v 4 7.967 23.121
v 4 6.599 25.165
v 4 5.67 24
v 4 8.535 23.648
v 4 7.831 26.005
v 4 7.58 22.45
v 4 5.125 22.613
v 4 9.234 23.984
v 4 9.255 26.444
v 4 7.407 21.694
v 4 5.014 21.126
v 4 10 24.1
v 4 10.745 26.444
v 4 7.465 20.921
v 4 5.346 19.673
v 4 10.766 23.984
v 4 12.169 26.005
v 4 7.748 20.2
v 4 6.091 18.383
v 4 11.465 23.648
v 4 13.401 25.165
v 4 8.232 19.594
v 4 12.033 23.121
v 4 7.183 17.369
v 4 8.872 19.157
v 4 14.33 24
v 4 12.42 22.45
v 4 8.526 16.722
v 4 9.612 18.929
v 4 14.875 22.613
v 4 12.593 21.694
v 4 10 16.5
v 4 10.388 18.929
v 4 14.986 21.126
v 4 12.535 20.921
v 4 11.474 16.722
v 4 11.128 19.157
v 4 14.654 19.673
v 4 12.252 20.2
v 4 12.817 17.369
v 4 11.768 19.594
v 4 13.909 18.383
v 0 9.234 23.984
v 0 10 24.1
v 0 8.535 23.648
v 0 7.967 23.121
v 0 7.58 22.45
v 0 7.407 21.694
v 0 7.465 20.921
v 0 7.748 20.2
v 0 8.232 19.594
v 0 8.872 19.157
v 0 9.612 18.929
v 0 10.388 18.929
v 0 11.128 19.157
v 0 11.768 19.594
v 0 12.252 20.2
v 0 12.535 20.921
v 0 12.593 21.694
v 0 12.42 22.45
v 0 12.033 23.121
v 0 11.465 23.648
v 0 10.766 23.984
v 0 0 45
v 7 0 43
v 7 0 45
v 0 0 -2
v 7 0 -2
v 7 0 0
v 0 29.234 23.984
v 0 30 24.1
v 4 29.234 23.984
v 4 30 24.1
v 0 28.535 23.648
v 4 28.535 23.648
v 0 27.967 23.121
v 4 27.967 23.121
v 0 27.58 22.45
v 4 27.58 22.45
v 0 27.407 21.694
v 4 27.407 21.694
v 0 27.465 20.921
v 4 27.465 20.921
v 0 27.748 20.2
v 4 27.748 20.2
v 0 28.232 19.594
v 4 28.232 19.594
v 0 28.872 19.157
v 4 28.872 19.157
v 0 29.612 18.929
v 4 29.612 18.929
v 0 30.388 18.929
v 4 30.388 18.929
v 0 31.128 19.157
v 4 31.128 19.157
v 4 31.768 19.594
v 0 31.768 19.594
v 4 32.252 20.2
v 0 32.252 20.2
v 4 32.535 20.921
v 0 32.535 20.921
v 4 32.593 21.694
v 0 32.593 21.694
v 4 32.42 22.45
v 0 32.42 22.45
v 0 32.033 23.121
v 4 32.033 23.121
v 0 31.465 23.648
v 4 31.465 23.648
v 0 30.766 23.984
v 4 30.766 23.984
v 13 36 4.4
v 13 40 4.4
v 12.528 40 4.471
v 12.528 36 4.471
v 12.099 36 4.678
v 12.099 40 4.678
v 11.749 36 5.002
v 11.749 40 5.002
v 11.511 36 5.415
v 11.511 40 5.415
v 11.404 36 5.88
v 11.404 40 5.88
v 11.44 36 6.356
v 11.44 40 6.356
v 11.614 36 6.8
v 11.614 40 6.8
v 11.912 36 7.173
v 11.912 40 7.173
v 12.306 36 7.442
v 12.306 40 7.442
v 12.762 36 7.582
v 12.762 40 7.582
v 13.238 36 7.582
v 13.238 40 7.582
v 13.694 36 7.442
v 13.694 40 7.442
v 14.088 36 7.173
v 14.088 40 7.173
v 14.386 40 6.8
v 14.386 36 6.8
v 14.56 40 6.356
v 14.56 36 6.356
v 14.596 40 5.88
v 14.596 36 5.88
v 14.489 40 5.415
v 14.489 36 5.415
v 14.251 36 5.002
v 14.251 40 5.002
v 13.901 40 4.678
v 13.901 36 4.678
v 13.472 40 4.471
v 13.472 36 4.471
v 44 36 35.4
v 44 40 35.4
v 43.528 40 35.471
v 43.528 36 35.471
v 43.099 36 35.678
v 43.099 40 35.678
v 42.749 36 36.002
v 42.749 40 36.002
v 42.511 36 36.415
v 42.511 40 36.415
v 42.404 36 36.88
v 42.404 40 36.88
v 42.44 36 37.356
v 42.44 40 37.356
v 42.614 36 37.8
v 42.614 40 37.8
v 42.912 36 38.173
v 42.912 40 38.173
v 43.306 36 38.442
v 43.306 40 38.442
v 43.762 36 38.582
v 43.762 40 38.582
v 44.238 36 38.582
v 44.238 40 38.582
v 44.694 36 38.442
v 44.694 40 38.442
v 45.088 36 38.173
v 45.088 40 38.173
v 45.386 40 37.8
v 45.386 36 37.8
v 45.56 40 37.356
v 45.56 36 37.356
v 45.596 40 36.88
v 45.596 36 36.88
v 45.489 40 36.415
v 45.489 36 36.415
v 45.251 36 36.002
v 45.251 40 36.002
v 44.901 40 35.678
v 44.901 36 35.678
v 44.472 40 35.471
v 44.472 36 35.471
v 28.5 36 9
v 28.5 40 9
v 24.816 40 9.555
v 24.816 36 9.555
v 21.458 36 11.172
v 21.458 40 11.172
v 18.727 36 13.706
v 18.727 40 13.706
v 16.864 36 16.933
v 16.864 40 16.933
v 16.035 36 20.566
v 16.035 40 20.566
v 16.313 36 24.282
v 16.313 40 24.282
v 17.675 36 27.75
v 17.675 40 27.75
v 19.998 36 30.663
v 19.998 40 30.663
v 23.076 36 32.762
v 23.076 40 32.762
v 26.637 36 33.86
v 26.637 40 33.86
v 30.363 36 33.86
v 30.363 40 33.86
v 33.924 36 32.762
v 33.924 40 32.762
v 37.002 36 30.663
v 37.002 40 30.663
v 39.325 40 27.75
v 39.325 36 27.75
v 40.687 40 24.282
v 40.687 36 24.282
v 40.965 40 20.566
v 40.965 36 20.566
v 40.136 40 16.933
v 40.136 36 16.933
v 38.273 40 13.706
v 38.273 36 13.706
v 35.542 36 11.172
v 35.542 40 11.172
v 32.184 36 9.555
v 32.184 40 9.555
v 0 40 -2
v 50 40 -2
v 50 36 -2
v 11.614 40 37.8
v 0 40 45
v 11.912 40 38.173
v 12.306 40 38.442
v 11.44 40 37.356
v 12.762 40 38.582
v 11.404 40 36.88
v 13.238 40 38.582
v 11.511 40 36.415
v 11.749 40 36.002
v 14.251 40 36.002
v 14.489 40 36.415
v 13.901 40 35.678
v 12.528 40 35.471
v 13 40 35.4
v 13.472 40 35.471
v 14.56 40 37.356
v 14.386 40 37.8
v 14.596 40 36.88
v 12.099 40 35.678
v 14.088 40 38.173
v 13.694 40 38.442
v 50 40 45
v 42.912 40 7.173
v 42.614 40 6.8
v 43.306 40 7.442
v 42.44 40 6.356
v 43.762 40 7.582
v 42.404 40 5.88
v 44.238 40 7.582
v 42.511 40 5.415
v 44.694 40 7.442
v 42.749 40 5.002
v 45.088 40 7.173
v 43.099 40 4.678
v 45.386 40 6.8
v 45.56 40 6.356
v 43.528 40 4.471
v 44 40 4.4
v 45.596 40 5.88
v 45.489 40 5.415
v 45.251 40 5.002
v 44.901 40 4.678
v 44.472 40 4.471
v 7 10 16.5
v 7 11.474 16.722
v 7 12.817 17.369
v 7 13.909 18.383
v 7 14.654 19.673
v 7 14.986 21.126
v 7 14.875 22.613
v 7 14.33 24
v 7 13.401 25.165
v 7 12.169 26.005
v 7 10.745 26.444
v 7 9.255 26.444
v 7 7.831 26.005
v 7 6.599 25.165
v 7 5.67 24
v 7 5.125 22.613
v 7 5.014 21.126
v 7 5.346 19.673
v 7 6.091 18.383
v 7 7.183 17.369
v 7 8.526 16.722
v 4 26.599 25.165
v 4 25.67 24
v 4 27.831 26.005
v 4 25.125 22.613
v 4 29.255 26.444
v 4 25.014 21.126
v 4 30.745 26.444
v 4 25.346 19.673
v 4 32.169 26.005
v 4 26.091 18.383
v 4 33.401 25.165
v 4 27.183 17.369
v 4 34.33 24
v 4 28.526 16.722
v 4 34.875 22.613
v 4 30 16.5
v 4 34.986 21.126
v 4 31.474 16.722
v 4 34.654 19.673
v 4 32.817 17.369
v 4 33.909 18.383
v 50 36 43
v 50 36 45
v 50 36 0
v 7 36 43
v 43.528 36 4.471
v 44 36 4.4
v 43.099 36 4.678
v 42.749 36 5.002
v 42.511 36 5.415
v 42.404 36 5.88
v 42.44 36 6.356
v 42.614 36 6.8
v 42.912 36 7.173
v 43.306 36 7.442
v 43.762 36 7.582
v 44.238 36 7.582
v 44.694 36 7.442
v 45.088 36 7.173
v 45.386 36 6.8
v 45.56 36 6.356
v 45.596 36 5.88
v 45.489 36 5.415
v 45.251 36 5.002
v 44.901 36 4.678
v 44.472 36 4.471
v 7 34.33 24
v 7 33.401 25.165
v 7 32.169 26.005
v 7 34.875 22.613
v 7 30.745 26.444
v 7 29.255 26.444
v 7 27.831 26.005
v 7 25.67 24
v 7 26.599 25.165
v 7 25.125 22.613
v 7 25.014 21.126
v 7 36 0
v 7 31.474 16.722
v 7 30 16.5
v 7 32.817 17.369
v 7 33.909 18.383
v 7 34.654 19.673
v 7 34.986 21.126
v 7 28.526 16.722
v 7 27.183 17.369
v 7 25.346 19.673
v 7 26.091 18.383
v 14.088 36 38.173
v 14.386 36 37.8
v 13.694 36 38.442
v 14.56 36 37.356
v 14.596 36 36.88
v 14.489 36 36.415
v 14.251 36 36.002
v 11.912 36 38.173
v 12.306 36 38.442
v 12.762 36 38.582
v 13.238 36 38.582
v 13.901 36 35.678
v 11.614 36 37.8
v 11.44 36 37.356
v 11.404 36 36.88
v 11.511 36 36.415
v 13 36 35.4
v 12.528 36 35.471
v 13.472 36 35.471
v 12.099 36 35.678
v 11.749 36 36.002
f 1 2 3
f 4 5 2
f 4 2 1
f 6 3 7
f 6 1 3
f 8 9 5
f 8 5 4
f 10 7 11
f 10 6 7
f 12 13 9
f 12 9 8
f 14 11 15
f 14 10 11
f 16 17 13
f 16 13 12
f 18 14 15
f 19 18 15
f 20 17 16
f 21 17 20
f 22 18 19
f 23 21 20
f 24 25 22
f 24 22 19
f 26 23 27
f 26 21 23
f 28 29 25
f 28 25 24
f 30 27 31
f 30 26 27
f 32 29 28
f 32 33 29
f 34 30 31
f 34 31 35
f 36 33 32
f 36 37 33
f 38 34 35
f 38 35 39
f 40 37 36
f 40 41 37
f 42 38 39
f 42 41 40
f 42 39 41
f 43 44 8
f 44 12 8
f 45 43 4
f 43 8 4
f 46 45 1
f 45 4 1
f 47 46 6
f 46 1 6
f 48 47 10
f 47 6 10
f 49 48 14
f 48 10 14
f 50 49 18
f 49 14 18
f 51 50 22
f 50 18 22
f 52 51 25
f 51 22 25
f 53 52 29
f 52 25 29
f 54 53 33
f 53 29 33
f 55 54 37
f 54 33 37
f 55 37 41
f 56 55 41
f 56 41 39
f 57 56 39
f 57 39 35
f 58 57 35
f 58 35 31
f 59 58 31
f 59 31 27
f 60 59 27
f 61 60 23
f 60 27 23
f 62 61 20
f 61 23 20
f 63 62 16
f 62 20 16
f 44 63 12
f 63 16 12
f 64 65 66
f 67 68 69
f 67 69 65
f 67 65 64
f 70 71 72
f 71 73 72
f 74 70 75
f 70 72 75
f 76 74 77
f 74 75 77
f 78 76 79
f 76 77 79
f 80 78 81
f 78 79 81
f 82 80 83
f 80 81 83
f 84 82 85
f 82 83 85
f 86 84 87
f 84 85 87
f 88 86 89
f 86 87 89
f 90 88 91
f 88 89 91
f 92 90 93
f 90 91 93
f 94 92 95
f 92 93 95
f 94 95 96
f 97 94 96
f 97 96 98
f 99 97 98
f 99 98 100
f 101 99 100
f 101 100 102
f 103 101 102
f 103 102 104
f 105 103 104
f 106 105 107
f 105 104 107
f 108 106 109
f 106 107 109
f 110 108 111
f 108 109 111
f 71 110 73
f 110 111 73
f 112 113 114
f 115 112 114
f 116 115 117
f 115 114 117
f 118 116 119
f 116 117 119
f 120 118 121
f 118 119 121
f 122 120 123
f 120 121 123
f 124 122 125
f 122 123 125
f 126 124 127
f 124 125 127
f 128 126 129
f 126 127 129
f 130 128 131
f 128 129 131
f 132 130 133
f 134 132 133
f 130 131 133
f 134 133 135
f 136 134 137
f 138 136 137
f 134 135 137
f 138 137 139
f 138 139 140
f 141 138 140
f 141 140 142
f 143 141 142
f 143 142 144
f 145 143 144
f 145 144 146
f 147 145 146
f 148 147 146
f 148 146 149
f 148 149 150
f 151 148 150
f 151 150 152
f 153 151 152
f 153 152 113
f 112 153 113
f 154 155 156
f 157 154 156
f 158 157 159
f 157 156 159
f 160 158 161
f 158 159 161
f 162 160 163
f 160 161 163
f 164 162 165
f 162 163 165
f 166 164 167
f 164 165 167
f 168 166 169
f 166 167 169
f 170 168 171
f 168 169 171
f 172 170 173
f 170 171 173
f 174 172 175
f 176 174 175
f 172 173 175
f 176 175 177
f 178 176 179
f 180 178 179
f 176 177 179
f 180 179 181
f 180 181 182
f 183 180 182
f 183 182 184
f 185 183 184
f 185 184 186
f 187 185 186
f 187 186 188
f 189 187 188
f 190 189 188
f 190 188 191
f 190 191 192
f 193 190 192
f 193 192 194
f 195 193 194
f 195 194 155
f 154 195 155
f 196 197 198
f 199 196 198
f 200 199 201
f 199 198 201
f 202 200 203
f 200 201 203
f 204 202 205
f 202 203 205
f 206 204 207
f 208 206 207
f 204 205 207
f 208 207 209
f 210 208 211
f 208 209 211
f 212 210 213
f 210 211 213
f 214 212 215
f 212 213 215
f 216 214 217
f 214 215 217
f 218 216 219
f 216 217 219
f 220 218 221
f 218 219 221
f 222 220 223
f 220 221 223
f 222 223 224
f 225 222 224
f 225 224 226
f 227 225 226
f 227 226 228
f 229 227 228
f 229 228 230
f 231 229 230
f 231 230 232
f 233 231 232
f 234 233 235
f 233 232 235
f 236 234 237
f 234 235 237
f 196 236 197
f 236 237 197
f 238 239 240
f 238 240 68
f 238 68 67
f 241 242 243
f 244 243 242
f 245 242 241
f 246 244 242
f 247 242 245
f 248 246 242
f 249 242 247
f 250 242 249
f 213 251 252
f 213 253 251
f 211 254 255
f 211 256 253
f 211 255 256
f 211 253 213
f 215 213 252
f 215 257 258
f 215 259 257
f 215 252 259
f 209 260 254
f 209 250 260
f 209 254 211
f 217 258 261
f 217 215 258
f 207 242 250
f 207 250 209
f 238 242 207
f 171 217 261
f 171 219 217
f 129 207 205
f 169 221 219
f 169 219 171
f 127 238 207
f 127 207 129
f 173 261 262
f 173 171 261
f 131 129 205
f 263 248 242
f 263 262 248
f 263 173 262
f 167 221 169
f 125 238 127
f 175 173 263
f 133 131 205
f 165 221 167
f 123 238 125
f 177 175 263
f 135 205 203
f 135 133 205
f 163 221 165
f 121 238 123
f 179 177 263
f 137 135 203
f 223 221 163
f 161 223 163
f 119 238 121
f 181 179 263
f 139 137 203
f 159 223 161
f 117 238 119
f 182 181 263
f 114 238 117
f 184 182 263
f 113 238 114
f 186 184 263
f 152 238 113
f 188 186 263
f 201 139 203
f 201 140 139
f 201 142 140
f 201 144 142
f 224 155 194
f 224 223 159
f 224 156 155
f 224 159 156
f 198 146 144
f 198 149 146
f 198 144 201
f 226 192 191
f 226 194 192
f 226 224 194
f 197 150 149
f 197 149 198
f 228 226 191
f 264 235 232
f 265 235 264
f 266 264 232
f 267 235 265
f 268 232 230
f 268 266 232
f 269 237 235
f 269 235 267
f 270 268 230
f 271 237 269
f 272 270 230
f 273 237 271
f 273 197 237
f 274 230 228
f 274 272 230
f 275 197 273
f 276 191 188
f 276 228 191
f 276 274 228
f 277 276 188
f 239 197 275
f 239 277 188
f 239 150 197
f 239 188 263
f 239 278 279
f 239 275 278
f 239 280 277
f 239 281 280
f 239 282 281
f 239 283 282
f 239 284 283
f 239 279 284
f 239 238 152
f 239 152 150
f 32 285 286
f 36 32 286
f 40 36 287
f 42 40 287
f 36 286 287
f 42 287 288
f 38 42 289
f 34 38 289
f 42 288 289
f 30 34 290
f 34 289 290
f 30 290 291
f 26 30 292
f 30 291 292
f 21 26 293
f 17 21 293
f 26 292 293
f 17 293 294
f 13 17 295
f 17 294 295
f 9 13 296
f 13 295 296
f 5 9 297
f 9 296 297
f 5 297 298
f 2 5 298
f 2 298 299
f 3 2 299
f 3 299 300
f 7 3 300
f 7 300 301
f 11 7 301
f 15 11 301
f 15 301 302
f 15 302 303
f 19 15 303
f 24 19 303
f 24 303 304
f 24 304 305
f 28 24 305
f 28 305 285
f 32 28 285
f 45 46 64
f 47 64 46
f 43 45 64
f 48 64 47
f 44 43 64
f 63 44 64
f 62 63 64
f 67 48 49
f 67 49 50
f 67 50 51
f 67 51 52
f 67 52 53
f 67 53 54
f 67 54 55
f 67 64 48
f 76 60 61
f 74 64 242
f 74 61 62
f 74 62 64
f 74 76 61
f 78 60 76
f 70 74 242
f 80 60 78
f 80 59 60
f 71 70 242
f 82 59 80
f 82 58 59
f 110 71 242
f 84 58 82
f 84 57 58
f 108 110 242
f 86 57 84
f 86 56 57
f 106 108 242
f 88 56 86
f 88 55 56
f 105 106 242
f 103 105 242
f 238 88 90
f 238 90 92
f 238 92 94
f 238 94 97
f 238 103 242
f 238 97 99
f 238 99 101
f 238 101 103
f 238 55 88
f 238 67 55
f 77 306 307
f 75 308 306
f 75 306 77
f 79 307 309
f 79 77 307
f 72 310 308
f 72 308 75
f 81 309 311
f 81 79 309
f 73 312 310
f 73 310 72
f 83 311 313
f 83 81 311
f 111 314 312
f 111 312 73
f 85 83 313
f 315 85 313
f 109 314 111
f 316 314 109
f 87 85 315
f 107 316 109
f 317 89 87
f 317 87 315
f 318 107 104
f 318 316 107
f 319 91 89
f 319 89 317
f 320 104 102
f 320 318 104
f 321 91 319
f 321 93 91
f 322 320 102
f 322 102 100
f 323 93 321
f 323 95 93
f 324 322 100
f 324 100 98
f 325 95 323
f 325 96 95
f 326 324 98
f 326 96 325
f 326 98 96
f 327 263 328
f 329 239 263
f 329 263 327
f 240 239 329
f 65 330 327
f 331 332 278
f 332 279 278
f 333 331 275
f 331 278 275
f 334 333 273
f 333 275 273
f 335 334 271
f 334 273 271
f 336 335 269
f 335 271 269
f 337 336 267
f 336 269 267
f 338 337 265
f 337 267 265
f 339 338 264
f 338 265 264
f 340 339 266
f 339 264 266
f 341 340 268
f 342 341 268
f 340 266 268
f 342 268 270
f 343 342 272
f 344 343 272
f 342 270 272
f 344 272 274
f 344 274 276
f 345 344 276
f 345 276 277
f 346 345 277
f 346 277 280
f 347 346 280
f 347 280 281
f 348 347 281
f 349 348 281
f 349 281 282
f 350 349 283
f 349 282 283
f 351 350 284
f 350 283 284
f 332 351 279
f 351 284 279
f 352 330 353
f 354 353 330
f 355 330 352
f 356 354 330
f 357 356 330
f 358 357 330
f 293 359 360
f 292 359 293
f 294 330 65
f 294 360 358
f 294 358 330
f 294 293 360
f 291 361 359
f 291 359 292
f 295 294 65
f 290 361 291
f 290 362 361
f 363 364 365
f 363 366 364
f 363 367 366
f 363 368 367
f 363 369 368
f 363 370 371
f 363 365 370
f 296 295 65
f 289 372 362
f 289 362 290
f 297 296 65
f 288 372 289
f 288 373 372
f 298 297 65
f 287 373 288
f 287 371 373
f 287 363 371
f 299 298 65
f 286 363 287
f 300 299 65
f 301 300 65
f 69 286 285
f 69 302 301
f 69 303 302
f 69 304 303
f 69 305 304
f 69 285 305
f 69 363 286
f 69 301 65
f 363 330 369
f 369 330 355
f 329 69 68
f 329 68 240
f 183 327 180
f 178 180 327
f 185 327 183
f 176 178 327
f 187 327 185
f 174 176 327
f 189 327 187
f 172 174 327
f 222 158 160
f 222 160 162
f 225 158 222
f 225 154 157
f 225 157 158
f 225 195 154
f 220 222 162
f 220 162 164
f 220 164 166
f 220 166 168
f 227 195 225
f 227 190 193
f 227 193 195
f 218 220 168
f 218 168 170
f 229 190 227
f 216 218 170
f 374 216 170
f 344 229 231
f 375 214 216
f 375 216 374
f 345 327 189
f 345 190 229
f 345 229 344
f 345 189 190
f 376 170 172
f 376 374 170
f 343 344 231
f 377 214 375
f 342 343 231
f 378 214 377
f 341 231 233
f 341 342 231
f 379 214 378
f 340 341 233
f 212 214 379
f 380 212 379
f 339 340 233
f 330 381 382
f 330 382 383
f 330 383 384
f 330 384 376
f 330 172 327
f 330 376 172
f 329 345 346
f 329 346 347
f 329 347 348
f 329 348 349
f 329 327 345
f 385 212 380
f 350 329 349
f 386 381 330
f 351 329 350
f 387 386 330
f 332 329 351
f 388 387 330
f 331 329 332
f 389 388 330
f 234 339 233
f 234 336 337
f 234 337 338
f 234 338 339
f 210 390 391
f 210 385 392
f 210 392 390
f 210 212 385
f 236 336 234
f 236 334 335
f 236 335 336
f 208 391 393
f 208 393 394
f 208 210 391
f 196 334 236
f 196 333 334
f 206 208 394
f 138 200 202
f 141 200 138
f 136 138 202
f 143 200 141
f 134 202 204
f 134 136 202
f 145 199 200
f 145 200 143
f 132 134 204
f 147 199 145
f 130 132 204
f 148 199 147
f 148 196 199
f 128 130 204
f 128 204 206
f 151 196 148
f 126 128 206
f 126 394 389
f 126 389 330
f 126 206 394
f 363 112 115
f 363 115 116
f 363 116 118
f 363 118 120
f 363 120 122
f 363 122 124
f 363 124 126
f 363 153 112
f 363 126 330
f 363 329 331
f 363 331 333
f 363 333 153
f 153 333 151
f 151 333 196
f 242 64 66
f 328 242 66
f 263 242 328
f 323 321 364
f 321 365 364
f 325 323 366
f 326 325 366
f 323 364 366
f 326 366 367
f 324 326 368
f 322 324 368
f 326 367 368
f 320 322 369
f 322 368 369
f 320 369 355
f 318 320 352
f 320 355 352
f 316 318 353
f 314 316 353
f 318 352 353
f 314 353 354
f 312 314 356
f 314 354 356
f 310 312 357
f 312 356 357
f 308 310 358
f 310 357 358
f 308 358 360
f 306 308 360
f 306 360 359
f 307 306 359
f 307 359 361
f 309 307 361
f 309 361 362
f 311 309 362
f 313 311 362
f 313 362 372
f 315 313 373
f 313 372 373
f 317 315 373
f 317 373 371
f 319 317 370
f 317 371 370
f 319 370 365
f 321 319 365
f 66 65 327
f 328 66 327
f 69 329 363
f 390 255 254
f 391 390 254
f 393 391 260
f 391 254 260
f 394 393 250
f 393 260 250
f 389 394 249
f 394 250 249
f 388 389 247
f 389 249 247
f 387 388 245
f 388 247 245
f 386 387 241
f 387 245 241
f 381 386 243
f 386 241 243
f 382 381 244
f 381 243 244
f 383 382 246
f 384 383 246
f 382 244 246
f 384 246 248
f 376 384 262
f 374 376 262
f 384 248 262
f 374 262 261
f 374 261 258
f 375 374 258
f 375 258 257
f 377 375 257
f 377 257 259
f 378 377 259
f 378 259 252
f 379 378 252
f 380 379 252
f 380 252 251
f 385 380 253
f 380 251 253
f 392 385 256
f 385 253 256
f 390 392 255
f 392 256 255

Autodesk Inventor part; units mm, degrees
ref_plane "YZ Plane" through (0, 0, 0) normal (1, 0, 0) x (0, 1, 0)
ref_plane "XZ Plane" through (0, 0, 0) normal (0, 1, 0) x (-1, 0, 0)
ref_plane "XY Plane" through (0, 0, 0) normal (0, 0, 1) x (1, 0, 0)
sketch "Sketch1" plane through (0, 0, 0) normal (0, 0, 1) x (1, 0, 0)
  line L0 (0, 0) -> (0, 40)
  line L1 (0, 40) -> (50, 40)
  line L2 (50, 40) -> (50, 36)
  line L3 (50, 36) -> (7, 36)
  line L4 (7, 36) -> (7, 0)
  line L5 (7, 0) -> (0, 0)
  dimension "d0" = 40
  dimension "d1" = 43
  dimension "d2" = 4
  dimension "d3" = 7
extrude "Extrusion1" add sketch "Sketch1" along normal blind 43
sketch "Sketch2" plane through (0, 0, 43) normal (0, 0, 1) x (1, 0, 0)
  line L0 (7, 0) -> (7, 36) projected
  line L1 (7, 36) -> (50, 36) projected
  line L2 (50, 36) -> (50, 40) projected
  line L3 (50, 40) -> (0, 40) projected
  line L4 (0, 40) -> (0, 0) projected
  line L5 (0, 0) -> (7, 0) projected
  line L6 (7, 0) -> (7, 36) projected
  line L7 (7, 36) -> (50, 36) projected
  line L8 (7, 0) -> (50, 36)
extrude "Extrusion2" add sketch "Sketch2" along normal blind 2
sketch "Sketch3" plane through (0, 0, 0) normal (0, 0, -1) x (-1, 0, 0)
  line L0 (-7, 0) -> (-7, 36) projected
  line L1 (0, 0) -> (-7, 0) projected
  line L2 (0, 40) -> (0, 0) projected
  line L3 (-50, 40) -> (0, 40) projected
  line L4 (-50, 36) -> (-50, 40) projected
  line L5 (-7, 36) -> (-50, 36) projected
  line L6 (0, 0) -> (-7, 0) projected
  line L7 (-7, 0) -> (-50, 36) projected
  line L8 (-7, 0) -> (-50, 36)
extrude "Extrusion3" add sketch "Sketch3" along normal blind 2
sketch "Sketch4" plane through (7, 36, 43) normal (0, -1, 0) x (1, 0, 0)
  line L0 (0, -43) -> (43, -43) projected
  line L1 (43, -43) -> (43, 0) projected
  line L2 (0, 0) -> (43, 0) projected
  line L3 (0, -43) -> (0, 0) projected
  line L4 (37, -6) -> (6, -6) construction
  line L5 (6, -6) -> (6, -37) construction
  line L6 (6, -37) -> (37, -37) construction
  line L7 (37, -37) -> (37, -6) construction
  line L8 (0, 0) -> (43, 0) construction
  point P0 (-7, -43)
  point P1 (21.5, -21.5)
  point P2 (37, -21.5)
  point P3 (43, -21.5)
  point P4 (21.5, 0)
  point P5 (21.5, -6)
  dimension "d10" = 31
  dimension "d11" = 31
hole "Hole1" at (44, 36, 37) at (44, 36, 6) at (13, 36, 6) at (13, 36, 37) direction (0, 1, 0) diameter 3.2 end through all
hole "Hole2" at (28.5, 36, 21.5) direction (0, 1, 0) diameter 25 end through all
sketch "Sketch5" plane through (0, 0, 45) normal (-1, 0, 0) x (0, 0, 1)
  line L0 (-47, 40) -> (0, 40) projected
  line L1 (-47, 0) -> (0, 0) projected
  point P0 (-45, 0)
  point P1 (-23.5, 30)
  point P2 (-23.5, 10)
  point P3 (-23.5, 40)
  dimension "d26" = 10
  dimension "d27" = 10
hole "Hole3" at (0, 30, 21.5) at (0, 10, 21.5) direction (1, 0, 0) diameter 5.2 end through all
sketch "Sketch6" plane through (7, 0, 43) normal (1, 0, 0) x (0, 0, -1)
  circle A0 centre (21.5, 30) radius 2.6 projected
  circle A1 centre (21.5, 10) radius 2.6 projected
  line L0 (43, 0) -> (43, 36) projected
  line L1 (43, 36) -> (0, 36) projected
  line L2 (0, 0) -> (0, 36) projected
  line L3 (43, 0) -> (0, 0) projected
  circle A2 centre (21.5, 30) radius 5
  circle A3 centre (21.5, 10) radius 5
  point P0 (43, 0)
  dimension "d35" = 10
  dimension "d36" = 10
extrude "Extrusion4" cut sketch "Sketch6" against normal blind 3 contours A2 | A3
properties part number "Extruder Mount"
